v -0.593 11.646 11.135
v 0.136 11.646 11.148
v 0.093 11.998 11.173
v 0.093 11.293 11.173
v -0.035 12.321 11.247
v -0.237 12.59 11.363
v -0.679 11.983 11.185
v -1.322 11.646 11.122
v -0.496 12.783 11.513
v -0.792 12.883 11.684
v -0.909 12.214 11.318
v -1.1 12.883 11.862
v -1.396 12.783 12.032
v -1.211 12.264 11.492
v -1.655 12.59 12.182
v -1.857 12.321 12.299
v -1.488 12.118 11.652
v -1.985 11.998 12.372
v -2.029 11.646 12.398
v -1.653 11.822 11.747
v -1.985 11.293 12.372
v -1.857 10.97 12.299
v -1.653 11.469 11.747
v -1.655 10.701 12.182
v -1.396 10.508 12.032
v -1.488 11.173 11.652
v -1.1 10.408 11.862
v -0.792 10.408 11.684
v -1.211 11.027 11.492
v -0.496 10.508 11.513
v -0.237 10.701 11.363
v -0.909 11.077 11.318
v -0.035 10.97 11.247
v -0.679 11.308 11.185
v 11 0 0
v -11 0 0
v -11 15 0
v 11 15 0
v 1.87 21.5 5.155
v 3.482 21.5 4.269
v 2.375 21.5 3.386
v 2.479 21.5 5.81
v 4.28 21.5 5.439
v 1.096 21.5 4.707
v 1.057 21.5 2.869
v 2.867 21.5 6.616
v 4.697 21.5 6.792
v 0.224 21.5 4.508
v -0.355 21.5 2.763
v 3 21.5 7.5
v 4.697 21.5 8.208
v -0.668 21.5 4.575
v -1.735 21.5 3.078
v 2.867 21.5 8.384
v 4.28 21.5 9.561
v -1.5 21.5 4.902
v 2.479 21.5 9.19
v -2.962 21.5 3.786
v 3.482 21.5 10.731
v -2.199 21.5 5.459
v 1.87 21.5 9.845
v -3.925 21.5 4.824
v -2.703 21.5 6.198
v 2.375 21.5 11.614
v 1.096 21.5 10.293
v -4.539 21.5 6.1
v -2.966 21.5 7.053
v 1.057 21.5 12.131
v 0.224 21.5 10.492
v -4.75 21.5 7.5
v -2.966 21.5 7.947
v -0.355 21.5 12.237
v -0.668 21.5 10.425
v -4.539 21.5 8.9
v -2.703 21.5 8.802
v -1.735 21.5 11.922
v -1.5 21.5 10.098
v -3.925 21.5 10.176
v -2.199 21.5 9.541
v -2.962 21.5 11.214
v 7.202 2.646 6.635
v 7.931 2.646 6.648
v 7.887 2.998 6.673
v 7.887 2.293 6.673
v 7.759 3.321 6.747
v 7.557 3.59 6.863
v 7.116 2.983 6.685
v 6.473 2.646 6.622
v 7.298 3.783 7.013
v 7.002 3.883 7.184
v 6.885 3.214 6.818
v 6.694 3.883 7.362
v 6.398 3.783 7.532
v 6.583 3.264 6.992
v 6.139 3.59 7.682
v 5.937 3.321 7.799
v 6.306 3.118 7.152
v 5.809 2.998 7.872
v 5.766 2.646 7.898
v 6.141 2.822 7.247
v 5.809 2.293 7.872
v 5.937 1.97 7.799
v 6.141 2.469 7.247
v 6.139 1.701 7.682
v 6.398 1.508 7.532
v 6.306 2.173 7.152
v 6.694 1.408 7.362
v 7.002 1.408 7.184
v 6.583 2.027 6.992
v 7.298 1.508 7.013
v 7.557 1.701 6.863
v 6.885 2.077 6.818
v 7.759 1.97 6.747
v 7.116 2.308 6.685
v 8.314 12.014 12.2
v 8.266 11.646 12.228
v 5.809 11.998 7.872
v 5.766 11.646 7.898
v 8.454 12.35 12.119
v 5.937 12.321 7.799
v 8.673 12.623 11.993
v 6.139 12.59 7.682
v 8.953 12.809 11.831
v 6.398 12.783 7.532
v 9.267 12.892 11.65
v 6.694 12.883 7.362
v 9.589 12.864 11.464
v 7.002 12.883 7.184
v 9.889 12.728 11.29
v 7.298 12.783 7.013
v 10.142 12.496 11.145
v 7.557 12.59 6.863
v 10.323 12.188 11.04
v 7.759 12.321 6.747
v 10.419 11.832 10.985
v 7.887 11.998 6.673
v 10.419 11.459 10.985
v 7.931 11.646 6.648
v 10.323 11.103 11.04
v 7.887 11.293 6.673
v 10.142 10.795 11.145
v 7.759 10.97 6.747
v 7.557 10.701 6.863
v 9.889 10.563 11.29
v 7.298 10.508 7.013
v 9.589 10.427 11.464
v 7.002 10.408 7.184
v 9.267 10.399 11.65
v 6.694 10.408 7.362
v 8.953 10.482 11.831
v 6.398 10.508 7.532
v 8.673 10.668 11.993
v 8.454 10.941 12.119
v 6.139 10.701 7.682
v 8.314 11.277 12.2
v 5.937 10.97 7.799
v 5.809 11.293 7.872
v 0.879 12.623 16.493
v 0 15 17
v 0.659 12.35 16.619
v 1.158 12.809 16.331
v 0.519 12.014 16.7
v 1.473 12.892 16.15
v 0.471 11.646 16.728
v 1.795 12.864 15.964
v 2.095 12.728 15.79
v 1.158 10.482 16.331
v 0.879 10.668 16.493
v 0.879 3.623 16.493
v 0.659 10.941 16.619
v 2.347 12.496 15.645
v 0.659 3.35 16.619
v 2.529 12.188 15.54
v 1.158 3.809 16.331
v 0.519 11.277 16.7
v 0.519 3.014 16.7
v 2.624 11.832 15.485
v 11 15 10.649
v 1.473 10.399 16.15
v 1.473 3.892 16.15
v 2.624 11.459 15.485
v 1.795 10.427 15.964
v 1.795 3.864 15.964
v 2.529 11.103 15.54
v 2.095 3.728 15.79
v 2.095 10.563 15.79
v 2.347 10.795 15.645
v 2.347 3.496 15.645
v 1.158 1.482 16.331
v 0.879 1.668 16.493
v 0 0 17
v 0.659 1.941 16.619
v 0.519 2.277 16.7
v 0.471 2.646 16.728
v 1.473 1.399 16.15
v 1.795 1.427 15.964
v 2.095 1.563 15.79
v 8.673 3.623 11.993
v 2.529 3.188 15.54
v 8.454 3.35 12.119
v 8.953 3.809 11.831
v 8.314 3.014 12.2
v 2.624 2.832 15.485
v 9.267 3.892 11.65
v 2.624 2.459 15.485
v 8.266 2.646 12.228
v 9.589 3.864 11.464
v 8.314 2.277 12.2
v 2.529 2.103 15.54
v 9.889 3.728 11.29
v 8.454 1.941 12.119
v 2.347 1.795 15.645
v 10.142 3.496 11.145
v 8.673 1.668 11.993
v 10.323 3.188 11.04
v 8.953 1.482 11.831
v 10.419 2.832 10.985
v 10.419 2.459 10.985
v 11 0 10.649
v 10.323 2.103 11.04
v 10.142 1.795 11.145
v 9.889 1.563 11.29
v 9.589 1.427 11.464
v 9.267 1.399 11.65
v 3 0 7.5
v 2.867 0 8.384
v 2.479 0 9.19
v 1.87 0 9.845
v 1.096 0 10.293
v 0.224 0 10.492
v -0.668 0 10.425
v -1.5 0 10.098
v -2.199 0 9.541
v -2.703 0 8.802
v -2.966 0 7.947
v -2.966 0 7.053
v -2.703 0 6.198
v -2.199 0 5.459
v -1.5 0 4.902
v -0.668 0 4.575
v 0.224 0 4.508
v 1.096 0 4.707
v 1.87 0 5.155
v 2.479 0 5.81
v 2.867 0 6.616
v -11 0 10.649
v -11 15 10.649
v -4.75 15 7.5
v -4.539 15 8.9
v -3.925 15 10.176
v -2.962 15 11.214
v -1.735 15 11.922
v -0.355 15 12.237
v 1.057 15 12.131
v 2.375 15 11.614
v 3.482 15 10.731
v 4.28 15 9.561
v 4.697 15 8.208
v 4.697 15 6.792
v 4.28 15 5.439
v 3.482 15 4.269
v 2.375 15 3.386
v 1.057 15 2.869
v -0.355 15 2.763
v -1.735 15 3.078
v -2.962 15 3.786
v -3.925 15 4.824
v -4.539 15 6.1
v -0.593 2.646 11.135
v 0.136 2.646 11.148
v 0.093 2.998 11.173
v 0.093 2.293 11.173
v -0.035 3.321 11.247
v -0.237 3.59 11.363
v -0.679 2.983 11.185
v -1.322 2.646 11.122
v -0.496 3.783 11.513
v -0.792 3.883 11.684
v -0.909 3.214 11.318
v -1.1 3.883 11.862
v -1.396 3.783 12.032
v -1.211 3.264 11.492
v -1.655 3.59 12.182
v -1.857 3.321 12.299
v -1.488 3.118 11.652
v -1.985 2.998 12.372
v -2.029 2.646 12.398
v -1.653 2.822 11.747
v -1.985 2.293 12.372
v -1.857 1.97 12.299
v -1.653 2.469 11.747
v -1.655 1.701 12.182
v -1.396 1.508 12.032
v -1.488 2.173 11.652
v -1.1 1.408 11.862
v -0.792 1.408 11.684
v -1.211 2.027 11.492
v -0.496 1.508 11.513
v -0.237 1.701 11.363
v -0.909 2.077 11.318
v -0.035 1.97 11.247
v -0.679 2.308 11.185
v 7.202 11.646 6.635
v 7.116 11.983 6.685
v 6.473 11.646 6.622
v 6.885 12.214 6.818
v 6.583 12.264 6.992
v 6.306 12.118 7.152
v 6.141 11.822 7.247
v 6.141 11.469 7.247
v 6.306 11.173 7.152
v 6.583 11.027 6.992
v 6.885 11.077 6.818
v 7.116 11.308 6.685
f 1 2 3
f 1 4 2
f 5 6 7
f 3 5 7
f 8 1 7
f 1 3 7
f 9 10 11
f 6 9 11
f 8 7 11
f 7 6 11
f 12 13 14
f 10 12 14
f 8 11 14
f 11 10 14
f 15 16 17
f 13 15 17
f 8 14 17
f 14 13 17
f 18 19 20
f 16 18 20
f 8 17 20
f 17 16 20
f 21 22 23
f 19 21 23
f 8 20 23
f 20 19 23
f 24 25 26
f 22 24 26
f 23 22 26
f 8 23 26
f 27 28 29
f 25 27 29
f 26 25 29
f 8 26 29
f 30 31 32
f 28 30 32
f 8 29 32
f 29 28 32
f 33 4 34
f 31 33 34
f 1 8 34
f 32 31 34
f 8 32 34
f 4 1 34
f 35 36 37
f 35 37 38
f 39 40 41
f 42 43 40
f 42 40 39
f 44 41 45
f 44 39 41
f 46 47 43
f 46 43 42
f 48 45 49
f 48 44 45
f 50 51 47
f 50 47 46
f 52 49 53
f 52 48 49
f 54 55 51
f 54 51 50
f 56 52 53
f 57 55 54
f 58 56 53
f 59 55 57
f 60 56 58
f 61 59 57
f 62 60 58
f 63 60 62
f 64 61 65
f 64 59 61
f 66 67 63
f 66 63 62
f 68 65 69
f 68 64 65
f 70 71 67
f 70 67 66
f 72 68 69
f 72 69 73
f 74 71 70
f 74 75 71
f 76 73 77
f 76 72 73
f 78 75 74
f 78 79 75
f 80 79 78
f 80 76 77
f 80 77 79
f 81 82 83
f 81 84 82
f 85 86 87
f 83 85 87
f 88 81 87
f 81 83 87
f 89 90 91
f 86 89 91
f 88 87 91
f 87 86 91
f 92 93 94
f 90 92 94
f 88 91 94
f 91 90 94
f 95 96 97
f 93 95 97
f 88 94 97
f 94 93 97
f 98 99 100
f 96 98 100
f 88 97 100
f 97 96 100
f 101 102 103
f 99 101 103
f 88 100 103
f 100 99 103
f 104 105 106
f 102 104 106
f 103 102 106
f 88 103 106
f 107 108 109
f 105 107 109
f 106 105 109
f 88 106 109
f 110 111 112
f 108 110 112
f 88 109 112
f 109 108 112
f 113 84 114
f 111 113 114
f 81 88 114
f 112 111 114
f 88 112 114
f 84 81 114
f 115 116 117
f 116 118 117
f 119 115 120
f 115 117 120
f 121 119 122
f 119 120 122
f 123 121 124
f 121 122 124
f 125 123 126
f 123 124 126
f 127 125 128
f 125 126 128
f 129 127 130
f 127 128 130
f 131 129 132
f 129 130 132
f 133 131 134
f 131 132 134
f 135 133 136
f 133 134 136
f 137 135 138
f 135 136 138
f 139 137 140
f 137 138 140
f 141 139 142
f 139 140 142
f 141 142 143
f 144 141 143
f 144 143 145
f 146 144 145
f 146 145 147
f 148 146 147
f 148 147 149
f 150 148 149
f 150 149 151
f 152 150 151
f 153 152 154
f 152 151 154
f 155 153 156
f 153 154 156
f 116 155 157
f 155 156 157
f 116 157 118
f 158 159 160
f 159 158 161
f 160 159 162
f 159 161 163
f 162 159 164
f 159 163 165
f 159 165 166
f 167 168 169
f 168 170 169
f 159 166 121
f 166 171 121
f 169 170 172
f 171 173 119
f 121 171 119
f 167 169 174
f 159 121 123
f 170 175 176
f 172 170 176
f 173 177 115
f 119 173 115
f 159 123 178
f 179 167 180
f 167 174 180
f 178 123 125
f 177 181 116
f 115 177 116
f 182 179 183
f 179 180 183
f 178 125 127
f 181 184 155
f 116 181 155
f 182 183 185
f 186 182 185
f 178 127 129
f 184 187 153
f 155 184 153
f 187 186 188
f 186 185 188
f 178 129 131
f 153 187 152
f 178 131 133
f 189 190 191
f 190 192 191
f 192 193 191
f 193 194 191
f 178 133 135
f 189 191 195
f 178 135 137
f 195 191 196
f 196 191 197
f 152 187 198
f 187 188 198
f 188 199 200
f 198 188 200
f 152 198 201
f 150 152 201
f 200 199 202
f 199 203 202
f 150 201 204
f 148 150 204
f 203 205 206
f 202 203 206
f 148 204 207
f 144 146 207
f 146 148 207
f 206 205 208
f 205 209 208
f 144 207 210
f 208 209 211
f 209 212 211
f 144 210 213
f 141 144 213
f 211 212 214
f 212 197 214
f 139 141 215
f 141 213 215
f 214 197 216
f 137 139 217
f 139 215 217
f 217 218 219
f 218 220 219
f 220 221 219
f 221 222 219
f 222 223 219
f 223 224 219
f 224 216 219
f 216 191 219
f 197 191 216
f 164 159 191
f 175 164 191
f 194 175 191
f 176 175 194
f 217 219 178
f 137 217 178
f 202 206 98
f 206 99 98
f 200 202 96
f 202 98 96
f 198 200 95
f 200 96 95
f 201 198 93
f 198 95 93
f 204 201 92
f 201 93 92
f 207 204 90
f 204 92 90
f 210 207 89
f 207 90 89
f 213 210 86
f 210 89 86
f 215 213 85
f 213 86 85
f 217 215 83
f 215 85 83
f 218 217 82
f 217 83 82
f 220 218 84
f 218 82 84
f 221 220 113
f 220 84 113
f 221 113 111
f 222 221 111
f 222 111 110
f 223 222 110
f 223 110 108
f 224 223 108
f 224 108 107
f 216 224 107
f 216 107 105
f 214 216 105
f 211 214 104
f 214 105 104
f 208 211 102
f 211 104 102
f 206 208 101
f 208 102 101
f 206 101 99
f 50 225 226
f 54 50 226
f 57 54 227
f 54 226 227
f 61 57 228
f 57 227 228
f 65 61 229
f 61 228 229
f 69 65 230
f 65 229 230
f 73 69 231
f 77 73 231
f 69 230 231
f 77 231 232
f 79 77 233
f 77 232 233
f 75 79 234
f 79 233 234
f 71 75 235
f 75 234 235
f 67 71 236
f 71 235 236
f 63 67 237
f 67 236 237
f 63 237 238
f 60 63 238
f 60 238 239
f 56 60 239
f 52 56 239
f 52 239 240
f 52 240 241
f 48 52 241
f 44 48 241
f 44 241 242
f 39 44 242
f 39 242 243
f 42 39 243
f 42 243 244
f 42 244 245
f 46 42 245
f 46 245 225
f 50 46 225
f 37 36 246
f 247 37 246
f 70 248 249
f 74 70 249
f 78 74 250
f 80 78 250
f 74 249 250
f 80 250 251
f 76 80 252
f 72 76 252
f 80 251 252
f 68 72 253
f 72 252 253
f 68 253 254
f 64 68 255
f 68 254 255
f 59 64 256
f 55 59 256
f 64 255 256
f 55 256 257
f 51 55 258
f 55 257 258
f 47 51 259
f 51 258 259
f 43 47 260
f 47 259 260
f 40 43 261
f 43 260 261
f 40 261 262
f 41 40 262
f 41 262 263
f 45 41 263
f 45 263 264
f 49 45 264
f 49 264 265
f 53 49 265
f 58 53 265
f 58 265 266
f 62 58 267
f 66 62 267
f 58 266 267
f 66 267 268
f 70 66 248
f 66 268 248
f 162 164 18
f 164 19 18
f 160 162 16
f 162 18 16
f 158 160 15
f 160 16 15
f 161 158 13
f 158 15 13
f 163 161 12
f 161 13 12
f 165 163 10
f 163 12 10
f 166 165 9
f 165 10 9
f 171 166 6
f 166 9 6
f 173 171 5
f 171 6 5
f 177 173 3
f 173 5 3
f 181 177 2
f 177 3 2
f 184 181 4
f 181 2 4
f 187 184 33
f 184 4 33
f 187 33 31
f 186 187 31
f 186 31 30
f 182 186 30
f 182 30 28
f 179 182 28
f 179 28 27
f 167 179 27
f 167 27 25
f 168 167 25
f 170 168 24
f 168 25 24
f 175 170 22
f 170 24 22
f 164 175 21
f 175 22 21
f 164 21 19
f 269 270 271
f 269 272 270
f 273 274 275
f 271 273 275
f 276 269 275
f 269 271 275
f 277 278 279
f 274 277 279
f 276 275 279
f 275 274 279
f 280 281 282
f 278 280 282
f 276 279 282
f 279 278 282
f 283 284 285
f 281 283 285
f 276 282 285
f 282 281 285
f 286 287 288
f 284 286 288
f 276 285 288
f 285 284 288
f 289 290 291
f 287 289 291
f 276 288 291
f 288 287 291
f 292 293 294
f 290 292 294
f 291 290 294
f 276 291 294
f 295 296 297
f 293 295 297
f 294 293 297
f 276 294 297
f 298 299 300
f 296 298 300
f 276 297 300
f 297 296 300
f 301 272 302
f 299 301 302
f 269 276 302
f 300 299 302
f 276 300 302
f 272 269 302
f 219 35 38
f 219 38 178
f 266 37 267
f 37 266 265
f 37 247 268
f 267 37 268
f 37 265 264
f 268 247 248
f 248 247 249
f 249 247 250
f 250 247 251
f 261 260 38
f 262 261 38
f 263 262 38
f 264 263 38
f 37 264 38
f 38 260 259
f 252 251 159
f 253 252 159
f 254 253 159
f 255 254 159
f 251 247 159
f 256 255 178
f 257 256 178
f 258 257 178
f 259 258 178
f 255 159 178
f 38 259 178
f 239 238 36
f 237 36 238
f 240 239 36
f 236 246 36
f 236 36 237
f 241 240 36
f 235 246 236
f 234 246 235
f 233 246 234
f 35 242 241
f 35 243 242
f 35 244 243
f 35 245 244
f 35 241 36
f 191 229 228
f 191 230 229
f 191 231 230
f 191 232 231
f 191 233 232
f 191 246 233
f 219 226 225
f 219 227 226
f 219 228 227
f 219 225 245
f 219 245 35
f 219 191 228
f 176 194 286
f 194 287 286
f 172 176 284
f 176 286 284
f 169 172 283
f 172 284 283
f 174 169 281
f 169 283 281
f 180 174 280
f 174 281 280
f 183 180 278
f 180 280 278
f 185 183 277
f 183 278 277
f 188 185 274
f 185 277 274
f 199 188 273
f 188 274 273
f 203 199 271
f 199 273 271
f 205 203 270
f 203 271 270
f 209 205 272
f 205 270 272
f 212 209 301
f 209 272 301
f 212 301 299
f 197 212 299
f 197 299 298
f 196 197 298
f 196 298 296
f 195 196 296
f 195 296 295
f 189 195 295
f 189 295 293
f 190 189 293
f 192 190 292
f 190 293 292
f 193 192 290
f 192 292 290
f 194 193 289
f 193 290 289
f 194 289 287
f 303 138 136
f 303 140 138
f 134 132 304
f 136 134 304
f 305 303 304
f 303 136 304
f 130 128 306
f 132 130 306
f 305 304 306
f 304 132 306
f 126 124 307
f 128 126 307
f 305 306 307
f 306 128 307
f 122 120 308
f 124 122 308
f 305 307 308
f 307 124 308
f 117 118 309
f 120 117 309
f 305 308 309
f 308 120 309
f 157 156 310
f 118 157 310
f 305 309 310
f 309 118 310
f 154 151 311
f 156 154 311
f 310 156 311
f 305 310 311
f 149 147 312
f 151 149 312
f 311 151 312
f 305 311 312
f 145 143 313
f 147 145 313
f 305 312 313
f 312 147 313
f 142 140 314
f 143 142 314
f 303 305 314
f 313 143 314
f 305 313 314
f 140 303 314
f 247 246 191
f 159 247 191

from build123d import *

# Parameters (mm, degrees)
F0_W     = 22
F0_H     = 17
F1_DEPTH = 15
F2_R     = 4.75
F3_DEPTH = 6.5
F4_R     = 3
F5_DEPTH = 21.501
F7_DEPTH = 21.501
F9_D     = 2.5
F9_DEPTH = 5
F9_TIP   = 0.7510757738


with BuildPart() as f1:
    # F0 (on Front) → F1 (new body)
    with BuildSketch(Plane.XZ):
        with Locations((0, 8.5)):
            Rectangle(F0_W, F0_H)
    extrude(amount=-F1_DEPTH)

    # F2 (on face) → F3 (join)
    with BuildSketch(Plane(origin=(0, 15, 0), x_dir=(-1, 0, 0), z_dir=(0, 1, 0))):
        with Locations((0, 7.5)):
            Circle(F2_R)
    extrude(amount=F3_DEPTH)

    # F4 (on face) → F5 (cut, through all)
    with BuildSketch(Plane.XZ):
        with Locations((0, 7.5)):
            Circle(F4_R)
    extrude(amount=-F5_DEPTH, mode=Mode.SUBTRACT)

    # F6 (on face) → F7 (cut, through all)
    with BuildSketch(Plane.XZ):
        Polygon((11, 17), (0, 17), (11, 10.6491470389), align=None)
        Polygon((-11, 10.6491470389), (0, 17), (-11, 17), align=None)
    extrude(amount=-F7_DEPTH, mode=Mode.SUBTRACT)

    # F9
    with Locations(Plane(origin=(7.3612159322, 0, 12.75), x_dir=(0.8660254038, 0, -0.5), z_dir=(0.5, 0, 0.8660254038))):
        with Locations((-6.7057428082, 2.6455062134), (-6.7057428082, 11.6455062134), (2.2942571918, 11.6455062134), (2.2942571918, 2.6455062134)):
            Hole(F9_D / 2, depth=F9_DEPTH)
            with Locations((0, 0, -(F9_DEPTH + F9_TIP / 2))):  # 118° drill point
                Cone(0, F9_D / 2, F9_TIP, mode=Mode.SUBTRACT)


solid = f1.part
